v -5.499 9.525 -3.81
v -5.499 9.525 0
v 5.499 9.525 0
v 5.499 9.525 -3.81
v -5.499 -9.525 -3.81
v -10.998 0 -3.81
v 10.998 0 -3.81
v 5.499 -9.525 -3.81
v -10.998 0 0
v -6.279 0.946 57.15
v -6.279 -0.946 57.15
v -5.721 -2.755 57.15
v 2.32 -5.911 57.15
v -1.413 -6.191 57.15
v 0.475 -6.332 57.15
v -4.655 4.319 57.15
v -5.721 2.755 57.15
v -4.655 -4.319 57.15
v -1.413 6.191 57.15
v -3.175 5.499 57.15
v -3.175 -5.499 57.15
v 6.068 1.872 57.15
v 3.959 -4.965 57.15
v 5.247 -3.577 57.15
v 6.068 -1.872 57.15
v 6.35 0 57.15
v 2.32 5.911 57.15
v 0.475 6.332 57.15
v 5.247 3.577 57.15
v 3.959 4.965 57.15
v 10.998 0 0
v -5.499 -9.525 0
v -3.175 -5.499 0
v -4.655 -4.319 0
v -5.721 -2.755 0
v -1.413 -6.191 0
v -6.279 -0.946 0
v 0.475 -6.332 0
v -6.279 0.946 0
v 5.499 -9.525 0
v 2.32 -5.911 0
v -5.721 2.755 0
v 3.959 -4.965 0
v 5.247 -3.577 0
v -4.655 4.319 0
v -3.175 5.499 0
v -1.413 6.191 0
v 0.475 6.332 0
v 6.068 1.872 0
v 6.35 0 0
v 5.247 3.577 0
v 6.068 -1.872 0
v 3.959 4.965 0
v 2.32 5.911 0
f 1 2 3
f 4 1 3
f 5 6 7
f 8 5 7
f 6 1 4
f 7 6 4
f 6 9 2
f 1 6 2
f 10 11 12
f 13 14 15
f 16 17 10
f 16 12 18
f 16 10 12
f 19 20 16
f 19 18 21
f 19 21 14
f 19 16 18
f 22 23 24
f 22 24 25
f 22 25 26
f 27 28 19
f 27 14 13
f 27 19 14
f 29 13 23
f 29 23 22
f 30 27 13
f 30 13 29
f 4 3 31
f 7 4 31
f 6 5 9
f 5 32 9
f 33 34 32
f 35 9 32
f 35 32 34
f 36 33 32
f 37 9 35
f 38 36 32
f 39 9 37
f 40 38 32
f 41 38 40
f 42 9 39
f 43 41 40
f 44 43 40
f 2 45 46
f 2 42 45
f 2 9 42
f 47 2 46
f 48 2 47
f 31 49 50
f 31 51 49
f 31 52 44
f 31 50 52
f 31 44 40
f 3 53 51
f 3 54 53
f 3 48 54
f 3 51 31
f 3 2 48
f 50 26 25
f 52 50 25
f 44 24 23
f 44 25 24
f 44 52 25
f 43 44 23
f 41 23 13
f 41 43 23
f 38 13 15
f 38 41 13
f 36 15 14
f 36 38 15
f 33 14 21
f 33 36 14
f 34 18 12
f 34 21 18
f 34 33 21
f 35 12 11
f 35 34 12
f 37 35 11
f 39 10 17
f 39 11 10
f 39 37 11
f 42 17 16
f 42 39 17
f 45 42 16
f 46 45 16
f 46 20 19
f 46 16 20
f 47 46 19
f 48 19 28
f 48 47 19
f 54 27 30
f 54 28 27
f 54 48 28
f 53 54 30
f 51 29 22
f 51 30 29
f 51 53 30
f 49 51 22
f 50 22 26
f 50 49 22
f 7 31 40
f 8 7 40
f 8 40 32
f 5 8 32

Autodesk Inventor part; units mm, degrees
ref_plane "YZ Plane" through (0, 0, 0) normal (1, 0, 0) x (0, 1, 0)
ref_plane "XZ Plane" through (0, 0, 0) normal (0, 1, 0) x (-1, 0, 0)
ref_plane "XY Plane" through (0, 0, 0) normal (0, 0, 1) x (1, 0, 0)
sketch "Sketch1" plane through (0, 0, 0) normal (0, 0, 1) x (1, 0, 0)
  line L0 (-10.9985, 0) -> (-5.4993, 9.525)
  line L1 (-5.4993, 9.525) -> (5.4993, 9.525)
  line L2 (5.4993, 9.525) -> (10.9985, 0)
  line L3 (10.9985, 0) -> (5.4993, -9.525)
  line L4 (5.4993, -9.525) -> (-5.4993, -9.525)
  line L5 (-5.4993, -9.525) -> (-10.9985, 0)
  point P0 (0, 0)
  point P1 (0, 0)
  dimension "d0" = 19.05
extrude "Extrusion1" add sketch "Sketch1" against normal blind 3.81
sketch "Sketch2" plane through (0, 0, 0) normal (0, 0, 1) x (1, 0, 0)
  circle A0 centre (0, 0) radius 6.35
  dimension "d3" = 12.7
extrude "Extrusion2" add sketch "Sketch2" along normal blind 57.15
thread "Thread1" size "1/2-13 UNC" class "2A" standard "ANSI Unified Screw Threads" full length
properties part number "LucasCharles Part6 bolt for arm to speaker holder Final" material "Stainless Steel, Austenitic"
